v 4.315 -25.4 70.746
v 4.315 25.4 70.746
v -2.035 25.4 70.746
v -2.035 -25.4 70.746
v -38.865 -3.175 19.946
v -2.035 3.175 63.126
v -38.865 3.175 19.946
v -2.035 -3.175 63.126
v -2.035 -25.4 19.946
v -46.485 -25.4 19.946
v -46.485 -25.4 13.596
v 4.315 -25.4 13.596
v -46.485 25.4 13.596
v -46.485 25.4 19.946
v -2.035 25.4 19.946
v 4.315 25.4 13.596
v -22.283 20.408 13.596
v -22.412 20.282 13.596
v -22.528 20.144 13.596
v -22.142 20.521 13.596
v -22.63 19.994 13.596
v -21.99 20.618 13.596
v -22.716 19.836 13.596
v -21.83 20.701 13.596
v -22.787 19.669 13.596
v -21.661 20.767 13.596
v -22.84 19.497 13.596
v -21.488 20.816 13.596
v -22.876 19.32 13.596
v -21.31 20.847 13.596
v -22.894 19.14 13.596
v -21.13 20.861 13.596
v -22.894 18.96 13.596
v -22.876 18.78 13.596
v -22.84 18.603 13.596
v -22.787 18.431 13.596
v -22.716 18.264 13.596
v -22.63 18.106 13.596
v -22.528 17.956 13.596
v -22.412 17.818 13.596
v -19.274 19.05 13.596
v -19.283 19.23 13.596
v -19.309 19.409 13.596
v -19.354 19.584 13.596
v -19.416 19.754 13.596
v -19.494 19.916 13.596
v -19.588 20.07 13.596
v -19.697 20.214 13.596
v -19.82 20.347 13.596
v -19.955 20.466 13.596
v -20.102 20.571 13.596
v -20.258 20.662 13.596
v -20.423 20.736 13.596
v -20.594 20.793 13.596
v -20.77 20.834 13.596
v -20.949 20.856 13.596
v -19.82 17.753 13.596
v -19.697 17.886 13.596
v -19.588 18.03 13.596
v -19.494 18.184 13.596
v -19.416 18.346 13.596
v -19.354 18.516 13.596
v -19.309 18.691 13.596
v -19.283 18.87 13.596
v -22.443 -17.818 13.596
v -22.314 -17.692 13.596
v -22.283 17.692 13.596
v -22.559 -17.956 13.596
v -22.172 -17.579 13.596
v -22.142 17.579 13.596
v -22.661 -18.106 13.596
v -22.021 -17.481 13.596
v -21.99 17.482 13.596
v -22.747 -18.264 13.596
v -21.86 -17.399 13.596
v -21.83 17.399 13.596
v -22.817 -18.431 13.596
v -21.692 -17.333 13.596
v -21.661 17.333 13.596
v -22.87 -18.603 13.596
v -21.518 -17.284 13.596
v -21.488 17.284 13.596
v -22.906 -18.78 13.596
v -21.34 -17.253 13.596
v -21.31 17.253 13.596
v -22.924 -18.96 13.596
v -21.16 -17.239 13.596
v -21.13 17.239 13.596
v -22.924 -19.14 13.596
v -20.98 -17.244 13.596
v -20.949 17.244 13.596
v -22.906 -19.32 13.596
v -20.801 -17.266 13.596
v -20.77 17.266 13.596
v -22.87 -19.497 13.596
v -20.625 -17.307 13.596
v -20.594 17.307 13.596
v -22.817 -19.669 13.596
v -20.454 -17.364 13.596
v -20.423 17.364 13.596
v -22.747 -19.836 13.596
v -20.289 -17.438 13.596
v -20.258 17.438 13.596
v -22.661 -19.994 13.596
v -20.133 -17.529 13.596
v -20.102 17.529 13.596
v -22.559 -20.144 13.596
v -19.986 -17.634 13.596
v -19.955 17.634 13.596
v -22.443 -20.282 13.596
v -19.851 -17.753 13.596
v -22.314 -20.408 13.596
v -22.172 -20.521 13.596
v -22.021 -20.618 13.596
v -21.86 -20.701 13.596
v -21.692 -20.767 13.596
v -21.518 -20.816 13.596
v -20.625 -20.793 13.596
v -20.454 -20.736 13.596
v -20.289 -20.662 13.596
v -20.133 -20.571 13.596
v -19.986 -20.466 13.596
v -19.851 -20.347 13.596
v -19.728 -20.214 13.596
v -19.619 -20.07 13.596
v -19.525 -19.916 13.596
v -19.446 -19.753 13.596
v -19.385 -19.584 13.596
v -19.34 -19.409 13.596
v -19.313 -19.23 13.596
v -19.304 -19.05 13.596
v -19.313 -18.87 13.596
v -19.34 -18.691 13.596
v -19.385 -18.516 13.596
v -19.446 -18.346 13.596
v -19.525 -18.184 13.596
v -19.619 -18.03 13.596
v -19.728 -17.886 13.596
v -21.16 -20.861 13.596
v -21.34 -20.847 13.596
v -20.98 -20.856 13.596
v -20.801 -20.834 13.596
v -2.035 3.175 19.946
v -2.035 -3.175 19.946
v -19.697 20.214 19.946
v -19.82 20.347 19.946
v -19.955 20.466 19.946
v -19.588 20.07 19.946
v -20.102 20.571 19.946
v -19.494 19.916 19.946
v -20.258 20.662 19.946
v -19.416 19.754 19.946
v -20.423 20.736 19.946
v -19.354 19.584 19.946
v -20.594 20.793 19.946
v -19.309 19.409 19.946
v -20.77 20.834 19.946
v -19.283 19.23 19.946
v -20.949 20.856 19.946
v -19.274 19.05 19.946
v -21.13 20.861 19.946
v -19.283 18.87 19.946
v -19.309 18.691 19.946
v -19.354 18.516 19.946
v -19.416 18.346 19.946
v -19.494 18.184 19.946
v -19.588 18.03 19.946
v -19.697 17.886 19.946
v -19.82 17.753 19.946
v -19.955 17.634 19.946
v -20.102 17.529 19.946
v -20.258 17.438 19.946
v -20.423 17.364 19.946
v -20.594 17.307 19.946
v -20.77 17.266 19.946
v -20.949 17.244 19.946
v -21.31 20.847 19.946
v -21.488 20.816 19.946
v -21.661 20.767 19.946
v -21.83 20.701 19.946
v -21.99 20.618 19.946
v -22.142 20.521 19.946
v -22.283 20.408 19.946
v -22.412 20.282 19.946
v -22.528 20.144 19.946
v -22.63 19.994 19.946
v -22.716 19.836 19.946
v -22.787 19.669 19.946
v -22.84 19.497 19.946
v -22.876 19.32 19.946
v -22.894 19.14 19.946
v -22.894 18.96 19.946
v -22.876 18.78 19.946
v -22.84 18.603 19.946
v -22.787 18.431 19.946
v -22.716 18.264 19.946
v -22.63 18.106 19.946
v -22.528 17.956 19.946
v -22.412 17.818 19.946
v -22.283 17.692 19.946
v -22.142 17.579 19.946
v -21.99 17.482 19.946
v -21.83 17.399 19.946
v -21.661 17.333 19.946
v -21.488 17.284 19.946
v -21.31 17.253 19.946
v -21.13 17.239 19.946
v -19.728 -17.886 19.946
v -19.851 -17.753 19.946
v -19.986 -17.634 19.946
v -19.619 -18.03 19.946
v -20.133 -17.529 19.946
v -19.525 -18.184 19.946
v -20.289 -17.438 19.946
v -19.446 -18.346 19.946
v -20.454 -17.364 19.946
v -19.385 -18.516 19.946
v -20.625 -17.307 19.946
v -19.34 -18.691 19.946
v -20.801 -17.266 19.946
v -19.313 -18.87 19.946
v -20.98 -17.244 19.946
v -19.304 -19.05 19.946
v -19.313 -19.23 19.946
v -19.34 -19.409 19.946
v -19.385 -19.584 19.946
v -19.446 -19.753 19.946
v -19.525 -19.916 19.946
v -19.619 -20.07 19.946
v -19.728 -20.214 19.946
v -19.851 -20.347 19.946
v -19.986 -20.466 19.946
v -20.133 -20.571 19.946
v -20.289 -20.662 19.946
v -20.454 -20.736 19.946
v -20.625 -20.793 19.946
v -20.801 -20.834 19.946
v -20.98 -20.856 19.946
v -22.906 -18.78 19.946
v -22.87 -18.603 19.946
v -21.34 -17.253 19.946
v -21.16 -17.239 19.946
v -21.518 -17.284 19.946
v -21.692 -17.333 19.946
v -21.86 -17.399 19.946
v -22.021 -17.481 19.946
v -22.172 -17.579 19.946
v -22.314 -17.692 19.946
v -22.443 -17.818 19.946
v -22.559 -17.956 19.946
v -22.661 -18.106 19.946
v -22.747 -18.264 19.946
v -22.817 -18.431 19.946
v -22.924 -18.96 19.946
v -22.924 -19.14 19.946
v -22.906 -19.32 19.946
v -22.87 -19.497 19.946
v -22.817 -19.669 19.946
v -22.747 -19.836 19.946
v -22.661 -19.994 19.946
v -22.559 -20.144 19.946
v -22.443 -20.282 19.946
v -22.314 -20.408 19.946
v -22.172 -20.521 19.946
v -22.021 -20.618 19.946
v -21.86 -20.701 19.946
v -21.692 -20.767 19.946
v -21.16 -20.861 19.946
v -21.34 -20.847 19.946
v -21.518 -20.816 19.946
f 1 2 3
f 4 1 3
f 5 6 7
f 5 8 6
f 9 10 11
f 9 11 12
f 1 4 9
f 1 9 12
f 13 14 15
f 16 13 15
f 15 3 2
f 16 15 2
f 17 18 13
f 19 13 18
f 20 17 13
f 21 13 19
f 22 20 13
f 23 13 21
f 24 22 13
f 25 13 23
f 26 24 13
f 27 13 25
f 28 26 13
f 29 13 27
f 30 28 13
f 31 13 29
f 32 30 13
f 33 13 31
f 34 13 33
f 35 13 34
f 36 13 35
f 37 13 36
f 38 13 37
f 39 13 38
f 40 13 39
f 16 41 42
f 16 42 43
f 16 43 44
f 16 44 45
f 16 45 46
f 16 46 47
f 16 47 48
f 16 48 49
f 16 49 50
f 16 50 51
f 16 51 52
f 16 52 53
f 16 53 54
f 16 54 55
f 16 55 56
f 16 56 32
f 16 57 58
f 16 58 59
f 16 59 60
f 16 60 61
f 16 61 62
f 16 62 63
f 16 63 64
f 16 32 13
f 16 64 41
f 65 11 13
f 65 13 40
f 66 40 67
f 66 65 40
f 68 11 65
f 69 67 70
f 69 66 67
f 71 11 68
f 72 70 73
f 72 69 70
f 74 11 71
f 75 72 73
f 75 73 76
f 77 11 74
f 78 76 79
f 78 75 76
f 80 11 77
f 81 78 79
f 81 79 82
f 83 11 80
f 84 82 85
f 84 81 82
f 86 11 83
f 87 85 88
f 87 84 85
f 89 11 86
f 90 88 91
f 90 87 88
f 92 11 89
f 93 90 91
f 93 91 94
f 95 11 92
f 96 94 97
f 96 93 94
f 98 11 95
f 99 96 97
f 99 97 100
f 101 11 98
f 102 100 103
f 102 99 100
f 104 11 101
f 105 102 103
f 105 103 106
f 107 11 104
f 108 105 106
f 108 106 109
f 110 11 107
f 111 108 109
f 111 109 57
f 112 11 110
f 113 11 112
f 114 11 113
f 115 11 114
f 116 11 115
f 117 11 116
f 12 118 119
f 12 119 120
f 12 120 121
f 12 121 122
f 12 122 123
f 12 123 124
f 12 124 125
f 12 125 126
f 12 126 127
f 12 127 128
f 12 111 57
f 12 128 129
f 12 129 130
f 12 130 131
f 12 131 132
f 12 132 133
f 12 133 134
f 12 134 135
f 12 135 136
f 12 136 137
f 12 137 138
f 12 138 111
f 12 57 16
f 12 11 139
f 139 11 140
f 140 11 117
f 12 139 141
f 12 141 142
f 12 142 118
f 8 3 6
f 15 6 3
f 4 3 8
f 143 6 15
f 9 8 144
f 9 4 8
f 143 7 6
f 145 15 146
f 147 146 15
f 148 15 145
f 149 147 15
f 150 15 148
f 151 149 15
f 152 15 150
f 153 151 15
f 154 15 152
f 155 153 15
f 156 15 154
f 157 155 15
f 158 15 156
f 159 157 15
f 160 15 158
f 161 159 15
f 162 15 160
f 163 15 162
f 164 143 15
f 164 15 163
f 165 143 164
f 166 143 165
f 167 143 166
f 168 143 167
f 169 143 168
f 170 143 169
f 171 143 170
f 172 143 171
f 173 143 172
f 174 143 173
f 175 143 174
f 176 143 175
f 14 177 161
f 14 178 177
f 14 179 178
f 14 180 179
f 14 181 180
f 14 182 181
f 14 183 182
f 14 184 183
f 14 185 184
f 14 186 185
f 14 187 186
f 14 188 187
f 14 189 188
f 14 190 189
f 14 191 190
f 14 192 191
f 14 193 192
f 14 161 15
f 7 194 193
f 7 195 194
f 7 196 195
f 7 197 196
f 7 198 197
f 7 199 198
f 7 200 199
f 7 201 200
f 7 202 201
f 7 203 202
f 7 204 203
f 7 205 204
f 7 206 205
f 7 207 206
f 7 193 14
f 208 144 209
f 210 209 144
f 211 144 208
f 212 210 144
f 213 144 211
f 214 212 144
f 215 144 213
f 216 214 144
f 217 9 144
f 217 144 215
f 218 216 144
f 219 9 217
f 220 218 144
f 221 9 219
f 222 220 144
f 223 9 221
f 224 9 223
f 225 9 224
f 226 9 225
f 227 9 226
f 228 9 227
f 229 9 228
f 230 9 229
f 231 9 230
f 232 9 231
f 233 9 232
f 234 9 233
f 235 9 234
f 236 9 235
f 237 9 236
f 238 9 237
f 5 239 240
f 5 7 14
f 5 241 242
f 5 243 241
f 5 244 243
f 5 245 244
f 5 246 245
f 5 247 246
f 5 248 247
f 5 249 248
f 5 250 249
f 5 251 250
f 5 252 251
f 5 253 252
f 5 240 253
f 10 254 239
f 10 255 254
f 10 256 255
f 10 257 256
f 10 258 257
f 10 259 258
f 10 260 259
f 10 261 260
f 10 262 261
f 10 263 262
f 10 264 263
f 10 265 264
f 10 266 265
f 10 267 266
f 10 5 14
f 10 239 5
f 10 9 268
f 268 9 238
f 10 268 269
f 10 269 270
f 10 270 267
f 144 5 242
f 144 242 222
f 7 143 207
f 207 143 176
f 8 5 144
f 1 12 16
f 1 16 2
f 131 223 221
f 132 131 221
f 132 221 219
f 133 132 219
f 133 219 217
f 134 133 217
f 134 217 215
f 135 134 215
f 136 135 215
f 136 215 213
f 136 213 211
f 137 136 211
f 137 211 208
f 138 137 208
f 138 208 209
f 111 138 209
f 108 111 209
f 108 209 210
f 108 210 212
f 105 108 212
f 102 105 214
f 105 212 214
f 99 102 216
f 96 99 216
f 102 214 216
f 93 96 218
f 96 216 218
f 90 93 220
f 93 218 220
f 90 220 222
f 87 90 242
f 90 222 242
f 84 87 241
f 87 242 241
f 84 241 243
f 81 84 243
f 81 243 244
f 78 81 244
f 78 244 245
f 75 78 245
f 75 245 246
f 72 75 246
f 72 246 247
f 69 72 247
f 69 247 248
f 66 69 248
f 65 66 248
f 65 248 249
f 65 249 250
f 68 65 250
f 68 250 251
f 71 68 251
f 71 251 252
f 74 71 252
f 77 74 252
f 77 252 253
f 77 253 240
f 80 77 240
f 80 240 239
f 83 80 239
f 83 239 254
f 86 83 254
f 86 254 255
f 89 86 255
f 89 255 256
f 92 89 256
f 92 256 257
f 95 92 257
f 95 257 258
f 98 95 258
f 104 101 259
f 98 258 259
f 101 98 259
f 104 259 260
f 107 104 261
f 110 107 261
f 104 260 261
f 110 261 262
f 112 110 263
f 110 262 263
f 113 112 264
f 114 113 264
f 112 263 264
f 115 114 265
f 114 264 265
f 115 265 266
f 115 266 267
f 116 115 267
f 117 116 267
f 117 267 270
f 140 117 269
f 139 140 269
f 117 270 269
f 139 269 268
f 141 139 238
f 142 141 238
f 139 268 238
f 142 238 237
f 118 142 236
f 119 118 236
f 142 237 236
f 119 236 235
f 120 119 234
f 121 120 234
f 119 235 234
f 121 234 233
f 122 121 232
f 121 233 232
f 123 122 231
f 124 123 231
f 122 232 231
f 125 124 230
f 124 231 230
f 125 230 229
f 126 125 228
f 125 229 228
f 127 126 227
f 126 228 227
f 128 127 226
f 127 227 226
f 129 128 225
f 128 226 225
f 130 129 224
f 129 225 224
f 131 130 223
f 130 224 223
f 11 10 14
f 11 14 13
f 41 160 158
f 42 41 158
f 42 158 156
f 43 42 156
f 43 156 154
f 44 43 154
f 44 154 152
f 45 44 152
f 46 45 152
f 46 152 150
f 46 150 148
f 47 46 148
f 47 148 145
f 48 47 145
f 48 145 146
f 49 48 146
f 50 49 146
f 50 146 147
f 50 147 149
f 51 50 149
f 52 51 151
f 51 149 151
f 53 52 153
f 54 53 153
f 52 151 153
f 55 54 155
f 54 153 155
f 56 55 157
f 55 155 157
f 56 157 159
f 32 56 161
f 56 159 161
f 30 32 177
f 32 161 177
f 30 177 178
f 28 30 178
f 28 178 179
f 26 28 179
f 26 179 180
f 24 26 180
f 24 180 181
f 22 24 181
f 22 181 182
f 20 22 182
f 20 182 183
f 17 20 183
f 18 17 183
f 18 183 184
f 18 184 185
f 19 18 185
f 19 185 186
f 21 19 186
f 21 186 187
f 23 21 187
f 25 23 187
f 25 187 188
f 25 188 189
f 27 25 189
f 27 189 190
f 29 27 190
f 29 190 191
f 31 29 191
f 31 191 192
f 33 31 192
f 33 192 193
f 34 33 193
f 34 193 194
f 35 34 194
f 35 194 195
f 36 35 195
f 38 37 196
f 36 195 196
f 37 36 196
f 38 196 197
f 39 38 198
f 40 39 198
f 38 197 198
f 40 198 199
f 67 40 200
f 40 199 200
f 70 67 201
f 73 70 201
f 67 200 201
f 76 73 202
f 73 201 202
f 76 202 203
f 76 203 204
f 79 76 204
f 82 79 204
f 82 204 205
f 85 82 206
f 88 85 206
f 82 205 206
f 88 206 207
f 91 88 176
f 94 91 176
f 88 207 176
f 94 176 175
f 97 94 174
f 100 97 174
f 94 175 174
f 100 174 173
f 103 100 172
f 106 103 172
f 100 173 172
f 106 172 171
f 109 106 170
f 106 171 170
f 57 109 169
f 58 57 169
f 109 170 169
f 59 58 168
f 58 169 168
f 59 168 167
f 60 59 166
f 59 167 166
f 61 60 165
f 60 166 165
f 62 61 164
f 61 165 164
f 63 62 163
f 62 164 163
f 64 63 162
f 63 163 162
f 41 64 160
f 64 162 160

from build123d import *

# Parameters (mm, degrees)
F1_DEPTH = 25.4
F2_DEPTH = 3.175
F3_R     = 1.811143
F4_DEPTH = 25.4


with BuildPart() as f1:
    # F0 (on Front) → F1 (new body, symmetric)
    with BuildSketch(Plane.XZ):
        Polygon((-38.864661, 19.945657), (-46.484661, 19.945657), (-46.484661, 13.595657), (4.315339, 13.595657), (4.315339, 19.945657), (-2.034661, 19.945657), align=None)
        Polygon((-2.034661, 63.125657), (-2.034661, 19.945657), (4.315339, 19.945657), (4.315339, 70.745657), (-2.034661, 70.745657), align=None)
    extrude(amount=F1_DEPTH, both=True)

    # F0 (on Front) → F2 (join, symmetric)
    with BuildSketch(Plane.XZ):
        Polygon((-38.864661, 19.945657), (-46.484661, 19.945657), (-46.484661, 13.595657), (4.315339, 13.595657), (4.315339, 19.945657), (-2.034661, 19.945657), align=None)
        Polygon((-2.034661, 63.125657), (-38.864661, 19.945657), (-2.034661, 19.945657), align=None)
        Polygon((-2.034661, 63.125657), (-2.034661, 19.945657), (4.315339, 19.945657), (4.315339, 70.745657), (-2.034661, 70.745657), align=None)
    extrude(amount=F2_DEPTH, both=True)

    # F3 (on face) → F4 (cut)
    with BuildSketch(Plane.XY.offset(19.945657)):
        with Locations((-21.084661, 19.05)):
            Circle(F3_R)
        with Locations((-21.115254, -19.049988)):
            Circle(F3_R)
    extrude(amount=-F4_DEPTH, mode=Mode.SUBTRACT)


solid = f1.part
